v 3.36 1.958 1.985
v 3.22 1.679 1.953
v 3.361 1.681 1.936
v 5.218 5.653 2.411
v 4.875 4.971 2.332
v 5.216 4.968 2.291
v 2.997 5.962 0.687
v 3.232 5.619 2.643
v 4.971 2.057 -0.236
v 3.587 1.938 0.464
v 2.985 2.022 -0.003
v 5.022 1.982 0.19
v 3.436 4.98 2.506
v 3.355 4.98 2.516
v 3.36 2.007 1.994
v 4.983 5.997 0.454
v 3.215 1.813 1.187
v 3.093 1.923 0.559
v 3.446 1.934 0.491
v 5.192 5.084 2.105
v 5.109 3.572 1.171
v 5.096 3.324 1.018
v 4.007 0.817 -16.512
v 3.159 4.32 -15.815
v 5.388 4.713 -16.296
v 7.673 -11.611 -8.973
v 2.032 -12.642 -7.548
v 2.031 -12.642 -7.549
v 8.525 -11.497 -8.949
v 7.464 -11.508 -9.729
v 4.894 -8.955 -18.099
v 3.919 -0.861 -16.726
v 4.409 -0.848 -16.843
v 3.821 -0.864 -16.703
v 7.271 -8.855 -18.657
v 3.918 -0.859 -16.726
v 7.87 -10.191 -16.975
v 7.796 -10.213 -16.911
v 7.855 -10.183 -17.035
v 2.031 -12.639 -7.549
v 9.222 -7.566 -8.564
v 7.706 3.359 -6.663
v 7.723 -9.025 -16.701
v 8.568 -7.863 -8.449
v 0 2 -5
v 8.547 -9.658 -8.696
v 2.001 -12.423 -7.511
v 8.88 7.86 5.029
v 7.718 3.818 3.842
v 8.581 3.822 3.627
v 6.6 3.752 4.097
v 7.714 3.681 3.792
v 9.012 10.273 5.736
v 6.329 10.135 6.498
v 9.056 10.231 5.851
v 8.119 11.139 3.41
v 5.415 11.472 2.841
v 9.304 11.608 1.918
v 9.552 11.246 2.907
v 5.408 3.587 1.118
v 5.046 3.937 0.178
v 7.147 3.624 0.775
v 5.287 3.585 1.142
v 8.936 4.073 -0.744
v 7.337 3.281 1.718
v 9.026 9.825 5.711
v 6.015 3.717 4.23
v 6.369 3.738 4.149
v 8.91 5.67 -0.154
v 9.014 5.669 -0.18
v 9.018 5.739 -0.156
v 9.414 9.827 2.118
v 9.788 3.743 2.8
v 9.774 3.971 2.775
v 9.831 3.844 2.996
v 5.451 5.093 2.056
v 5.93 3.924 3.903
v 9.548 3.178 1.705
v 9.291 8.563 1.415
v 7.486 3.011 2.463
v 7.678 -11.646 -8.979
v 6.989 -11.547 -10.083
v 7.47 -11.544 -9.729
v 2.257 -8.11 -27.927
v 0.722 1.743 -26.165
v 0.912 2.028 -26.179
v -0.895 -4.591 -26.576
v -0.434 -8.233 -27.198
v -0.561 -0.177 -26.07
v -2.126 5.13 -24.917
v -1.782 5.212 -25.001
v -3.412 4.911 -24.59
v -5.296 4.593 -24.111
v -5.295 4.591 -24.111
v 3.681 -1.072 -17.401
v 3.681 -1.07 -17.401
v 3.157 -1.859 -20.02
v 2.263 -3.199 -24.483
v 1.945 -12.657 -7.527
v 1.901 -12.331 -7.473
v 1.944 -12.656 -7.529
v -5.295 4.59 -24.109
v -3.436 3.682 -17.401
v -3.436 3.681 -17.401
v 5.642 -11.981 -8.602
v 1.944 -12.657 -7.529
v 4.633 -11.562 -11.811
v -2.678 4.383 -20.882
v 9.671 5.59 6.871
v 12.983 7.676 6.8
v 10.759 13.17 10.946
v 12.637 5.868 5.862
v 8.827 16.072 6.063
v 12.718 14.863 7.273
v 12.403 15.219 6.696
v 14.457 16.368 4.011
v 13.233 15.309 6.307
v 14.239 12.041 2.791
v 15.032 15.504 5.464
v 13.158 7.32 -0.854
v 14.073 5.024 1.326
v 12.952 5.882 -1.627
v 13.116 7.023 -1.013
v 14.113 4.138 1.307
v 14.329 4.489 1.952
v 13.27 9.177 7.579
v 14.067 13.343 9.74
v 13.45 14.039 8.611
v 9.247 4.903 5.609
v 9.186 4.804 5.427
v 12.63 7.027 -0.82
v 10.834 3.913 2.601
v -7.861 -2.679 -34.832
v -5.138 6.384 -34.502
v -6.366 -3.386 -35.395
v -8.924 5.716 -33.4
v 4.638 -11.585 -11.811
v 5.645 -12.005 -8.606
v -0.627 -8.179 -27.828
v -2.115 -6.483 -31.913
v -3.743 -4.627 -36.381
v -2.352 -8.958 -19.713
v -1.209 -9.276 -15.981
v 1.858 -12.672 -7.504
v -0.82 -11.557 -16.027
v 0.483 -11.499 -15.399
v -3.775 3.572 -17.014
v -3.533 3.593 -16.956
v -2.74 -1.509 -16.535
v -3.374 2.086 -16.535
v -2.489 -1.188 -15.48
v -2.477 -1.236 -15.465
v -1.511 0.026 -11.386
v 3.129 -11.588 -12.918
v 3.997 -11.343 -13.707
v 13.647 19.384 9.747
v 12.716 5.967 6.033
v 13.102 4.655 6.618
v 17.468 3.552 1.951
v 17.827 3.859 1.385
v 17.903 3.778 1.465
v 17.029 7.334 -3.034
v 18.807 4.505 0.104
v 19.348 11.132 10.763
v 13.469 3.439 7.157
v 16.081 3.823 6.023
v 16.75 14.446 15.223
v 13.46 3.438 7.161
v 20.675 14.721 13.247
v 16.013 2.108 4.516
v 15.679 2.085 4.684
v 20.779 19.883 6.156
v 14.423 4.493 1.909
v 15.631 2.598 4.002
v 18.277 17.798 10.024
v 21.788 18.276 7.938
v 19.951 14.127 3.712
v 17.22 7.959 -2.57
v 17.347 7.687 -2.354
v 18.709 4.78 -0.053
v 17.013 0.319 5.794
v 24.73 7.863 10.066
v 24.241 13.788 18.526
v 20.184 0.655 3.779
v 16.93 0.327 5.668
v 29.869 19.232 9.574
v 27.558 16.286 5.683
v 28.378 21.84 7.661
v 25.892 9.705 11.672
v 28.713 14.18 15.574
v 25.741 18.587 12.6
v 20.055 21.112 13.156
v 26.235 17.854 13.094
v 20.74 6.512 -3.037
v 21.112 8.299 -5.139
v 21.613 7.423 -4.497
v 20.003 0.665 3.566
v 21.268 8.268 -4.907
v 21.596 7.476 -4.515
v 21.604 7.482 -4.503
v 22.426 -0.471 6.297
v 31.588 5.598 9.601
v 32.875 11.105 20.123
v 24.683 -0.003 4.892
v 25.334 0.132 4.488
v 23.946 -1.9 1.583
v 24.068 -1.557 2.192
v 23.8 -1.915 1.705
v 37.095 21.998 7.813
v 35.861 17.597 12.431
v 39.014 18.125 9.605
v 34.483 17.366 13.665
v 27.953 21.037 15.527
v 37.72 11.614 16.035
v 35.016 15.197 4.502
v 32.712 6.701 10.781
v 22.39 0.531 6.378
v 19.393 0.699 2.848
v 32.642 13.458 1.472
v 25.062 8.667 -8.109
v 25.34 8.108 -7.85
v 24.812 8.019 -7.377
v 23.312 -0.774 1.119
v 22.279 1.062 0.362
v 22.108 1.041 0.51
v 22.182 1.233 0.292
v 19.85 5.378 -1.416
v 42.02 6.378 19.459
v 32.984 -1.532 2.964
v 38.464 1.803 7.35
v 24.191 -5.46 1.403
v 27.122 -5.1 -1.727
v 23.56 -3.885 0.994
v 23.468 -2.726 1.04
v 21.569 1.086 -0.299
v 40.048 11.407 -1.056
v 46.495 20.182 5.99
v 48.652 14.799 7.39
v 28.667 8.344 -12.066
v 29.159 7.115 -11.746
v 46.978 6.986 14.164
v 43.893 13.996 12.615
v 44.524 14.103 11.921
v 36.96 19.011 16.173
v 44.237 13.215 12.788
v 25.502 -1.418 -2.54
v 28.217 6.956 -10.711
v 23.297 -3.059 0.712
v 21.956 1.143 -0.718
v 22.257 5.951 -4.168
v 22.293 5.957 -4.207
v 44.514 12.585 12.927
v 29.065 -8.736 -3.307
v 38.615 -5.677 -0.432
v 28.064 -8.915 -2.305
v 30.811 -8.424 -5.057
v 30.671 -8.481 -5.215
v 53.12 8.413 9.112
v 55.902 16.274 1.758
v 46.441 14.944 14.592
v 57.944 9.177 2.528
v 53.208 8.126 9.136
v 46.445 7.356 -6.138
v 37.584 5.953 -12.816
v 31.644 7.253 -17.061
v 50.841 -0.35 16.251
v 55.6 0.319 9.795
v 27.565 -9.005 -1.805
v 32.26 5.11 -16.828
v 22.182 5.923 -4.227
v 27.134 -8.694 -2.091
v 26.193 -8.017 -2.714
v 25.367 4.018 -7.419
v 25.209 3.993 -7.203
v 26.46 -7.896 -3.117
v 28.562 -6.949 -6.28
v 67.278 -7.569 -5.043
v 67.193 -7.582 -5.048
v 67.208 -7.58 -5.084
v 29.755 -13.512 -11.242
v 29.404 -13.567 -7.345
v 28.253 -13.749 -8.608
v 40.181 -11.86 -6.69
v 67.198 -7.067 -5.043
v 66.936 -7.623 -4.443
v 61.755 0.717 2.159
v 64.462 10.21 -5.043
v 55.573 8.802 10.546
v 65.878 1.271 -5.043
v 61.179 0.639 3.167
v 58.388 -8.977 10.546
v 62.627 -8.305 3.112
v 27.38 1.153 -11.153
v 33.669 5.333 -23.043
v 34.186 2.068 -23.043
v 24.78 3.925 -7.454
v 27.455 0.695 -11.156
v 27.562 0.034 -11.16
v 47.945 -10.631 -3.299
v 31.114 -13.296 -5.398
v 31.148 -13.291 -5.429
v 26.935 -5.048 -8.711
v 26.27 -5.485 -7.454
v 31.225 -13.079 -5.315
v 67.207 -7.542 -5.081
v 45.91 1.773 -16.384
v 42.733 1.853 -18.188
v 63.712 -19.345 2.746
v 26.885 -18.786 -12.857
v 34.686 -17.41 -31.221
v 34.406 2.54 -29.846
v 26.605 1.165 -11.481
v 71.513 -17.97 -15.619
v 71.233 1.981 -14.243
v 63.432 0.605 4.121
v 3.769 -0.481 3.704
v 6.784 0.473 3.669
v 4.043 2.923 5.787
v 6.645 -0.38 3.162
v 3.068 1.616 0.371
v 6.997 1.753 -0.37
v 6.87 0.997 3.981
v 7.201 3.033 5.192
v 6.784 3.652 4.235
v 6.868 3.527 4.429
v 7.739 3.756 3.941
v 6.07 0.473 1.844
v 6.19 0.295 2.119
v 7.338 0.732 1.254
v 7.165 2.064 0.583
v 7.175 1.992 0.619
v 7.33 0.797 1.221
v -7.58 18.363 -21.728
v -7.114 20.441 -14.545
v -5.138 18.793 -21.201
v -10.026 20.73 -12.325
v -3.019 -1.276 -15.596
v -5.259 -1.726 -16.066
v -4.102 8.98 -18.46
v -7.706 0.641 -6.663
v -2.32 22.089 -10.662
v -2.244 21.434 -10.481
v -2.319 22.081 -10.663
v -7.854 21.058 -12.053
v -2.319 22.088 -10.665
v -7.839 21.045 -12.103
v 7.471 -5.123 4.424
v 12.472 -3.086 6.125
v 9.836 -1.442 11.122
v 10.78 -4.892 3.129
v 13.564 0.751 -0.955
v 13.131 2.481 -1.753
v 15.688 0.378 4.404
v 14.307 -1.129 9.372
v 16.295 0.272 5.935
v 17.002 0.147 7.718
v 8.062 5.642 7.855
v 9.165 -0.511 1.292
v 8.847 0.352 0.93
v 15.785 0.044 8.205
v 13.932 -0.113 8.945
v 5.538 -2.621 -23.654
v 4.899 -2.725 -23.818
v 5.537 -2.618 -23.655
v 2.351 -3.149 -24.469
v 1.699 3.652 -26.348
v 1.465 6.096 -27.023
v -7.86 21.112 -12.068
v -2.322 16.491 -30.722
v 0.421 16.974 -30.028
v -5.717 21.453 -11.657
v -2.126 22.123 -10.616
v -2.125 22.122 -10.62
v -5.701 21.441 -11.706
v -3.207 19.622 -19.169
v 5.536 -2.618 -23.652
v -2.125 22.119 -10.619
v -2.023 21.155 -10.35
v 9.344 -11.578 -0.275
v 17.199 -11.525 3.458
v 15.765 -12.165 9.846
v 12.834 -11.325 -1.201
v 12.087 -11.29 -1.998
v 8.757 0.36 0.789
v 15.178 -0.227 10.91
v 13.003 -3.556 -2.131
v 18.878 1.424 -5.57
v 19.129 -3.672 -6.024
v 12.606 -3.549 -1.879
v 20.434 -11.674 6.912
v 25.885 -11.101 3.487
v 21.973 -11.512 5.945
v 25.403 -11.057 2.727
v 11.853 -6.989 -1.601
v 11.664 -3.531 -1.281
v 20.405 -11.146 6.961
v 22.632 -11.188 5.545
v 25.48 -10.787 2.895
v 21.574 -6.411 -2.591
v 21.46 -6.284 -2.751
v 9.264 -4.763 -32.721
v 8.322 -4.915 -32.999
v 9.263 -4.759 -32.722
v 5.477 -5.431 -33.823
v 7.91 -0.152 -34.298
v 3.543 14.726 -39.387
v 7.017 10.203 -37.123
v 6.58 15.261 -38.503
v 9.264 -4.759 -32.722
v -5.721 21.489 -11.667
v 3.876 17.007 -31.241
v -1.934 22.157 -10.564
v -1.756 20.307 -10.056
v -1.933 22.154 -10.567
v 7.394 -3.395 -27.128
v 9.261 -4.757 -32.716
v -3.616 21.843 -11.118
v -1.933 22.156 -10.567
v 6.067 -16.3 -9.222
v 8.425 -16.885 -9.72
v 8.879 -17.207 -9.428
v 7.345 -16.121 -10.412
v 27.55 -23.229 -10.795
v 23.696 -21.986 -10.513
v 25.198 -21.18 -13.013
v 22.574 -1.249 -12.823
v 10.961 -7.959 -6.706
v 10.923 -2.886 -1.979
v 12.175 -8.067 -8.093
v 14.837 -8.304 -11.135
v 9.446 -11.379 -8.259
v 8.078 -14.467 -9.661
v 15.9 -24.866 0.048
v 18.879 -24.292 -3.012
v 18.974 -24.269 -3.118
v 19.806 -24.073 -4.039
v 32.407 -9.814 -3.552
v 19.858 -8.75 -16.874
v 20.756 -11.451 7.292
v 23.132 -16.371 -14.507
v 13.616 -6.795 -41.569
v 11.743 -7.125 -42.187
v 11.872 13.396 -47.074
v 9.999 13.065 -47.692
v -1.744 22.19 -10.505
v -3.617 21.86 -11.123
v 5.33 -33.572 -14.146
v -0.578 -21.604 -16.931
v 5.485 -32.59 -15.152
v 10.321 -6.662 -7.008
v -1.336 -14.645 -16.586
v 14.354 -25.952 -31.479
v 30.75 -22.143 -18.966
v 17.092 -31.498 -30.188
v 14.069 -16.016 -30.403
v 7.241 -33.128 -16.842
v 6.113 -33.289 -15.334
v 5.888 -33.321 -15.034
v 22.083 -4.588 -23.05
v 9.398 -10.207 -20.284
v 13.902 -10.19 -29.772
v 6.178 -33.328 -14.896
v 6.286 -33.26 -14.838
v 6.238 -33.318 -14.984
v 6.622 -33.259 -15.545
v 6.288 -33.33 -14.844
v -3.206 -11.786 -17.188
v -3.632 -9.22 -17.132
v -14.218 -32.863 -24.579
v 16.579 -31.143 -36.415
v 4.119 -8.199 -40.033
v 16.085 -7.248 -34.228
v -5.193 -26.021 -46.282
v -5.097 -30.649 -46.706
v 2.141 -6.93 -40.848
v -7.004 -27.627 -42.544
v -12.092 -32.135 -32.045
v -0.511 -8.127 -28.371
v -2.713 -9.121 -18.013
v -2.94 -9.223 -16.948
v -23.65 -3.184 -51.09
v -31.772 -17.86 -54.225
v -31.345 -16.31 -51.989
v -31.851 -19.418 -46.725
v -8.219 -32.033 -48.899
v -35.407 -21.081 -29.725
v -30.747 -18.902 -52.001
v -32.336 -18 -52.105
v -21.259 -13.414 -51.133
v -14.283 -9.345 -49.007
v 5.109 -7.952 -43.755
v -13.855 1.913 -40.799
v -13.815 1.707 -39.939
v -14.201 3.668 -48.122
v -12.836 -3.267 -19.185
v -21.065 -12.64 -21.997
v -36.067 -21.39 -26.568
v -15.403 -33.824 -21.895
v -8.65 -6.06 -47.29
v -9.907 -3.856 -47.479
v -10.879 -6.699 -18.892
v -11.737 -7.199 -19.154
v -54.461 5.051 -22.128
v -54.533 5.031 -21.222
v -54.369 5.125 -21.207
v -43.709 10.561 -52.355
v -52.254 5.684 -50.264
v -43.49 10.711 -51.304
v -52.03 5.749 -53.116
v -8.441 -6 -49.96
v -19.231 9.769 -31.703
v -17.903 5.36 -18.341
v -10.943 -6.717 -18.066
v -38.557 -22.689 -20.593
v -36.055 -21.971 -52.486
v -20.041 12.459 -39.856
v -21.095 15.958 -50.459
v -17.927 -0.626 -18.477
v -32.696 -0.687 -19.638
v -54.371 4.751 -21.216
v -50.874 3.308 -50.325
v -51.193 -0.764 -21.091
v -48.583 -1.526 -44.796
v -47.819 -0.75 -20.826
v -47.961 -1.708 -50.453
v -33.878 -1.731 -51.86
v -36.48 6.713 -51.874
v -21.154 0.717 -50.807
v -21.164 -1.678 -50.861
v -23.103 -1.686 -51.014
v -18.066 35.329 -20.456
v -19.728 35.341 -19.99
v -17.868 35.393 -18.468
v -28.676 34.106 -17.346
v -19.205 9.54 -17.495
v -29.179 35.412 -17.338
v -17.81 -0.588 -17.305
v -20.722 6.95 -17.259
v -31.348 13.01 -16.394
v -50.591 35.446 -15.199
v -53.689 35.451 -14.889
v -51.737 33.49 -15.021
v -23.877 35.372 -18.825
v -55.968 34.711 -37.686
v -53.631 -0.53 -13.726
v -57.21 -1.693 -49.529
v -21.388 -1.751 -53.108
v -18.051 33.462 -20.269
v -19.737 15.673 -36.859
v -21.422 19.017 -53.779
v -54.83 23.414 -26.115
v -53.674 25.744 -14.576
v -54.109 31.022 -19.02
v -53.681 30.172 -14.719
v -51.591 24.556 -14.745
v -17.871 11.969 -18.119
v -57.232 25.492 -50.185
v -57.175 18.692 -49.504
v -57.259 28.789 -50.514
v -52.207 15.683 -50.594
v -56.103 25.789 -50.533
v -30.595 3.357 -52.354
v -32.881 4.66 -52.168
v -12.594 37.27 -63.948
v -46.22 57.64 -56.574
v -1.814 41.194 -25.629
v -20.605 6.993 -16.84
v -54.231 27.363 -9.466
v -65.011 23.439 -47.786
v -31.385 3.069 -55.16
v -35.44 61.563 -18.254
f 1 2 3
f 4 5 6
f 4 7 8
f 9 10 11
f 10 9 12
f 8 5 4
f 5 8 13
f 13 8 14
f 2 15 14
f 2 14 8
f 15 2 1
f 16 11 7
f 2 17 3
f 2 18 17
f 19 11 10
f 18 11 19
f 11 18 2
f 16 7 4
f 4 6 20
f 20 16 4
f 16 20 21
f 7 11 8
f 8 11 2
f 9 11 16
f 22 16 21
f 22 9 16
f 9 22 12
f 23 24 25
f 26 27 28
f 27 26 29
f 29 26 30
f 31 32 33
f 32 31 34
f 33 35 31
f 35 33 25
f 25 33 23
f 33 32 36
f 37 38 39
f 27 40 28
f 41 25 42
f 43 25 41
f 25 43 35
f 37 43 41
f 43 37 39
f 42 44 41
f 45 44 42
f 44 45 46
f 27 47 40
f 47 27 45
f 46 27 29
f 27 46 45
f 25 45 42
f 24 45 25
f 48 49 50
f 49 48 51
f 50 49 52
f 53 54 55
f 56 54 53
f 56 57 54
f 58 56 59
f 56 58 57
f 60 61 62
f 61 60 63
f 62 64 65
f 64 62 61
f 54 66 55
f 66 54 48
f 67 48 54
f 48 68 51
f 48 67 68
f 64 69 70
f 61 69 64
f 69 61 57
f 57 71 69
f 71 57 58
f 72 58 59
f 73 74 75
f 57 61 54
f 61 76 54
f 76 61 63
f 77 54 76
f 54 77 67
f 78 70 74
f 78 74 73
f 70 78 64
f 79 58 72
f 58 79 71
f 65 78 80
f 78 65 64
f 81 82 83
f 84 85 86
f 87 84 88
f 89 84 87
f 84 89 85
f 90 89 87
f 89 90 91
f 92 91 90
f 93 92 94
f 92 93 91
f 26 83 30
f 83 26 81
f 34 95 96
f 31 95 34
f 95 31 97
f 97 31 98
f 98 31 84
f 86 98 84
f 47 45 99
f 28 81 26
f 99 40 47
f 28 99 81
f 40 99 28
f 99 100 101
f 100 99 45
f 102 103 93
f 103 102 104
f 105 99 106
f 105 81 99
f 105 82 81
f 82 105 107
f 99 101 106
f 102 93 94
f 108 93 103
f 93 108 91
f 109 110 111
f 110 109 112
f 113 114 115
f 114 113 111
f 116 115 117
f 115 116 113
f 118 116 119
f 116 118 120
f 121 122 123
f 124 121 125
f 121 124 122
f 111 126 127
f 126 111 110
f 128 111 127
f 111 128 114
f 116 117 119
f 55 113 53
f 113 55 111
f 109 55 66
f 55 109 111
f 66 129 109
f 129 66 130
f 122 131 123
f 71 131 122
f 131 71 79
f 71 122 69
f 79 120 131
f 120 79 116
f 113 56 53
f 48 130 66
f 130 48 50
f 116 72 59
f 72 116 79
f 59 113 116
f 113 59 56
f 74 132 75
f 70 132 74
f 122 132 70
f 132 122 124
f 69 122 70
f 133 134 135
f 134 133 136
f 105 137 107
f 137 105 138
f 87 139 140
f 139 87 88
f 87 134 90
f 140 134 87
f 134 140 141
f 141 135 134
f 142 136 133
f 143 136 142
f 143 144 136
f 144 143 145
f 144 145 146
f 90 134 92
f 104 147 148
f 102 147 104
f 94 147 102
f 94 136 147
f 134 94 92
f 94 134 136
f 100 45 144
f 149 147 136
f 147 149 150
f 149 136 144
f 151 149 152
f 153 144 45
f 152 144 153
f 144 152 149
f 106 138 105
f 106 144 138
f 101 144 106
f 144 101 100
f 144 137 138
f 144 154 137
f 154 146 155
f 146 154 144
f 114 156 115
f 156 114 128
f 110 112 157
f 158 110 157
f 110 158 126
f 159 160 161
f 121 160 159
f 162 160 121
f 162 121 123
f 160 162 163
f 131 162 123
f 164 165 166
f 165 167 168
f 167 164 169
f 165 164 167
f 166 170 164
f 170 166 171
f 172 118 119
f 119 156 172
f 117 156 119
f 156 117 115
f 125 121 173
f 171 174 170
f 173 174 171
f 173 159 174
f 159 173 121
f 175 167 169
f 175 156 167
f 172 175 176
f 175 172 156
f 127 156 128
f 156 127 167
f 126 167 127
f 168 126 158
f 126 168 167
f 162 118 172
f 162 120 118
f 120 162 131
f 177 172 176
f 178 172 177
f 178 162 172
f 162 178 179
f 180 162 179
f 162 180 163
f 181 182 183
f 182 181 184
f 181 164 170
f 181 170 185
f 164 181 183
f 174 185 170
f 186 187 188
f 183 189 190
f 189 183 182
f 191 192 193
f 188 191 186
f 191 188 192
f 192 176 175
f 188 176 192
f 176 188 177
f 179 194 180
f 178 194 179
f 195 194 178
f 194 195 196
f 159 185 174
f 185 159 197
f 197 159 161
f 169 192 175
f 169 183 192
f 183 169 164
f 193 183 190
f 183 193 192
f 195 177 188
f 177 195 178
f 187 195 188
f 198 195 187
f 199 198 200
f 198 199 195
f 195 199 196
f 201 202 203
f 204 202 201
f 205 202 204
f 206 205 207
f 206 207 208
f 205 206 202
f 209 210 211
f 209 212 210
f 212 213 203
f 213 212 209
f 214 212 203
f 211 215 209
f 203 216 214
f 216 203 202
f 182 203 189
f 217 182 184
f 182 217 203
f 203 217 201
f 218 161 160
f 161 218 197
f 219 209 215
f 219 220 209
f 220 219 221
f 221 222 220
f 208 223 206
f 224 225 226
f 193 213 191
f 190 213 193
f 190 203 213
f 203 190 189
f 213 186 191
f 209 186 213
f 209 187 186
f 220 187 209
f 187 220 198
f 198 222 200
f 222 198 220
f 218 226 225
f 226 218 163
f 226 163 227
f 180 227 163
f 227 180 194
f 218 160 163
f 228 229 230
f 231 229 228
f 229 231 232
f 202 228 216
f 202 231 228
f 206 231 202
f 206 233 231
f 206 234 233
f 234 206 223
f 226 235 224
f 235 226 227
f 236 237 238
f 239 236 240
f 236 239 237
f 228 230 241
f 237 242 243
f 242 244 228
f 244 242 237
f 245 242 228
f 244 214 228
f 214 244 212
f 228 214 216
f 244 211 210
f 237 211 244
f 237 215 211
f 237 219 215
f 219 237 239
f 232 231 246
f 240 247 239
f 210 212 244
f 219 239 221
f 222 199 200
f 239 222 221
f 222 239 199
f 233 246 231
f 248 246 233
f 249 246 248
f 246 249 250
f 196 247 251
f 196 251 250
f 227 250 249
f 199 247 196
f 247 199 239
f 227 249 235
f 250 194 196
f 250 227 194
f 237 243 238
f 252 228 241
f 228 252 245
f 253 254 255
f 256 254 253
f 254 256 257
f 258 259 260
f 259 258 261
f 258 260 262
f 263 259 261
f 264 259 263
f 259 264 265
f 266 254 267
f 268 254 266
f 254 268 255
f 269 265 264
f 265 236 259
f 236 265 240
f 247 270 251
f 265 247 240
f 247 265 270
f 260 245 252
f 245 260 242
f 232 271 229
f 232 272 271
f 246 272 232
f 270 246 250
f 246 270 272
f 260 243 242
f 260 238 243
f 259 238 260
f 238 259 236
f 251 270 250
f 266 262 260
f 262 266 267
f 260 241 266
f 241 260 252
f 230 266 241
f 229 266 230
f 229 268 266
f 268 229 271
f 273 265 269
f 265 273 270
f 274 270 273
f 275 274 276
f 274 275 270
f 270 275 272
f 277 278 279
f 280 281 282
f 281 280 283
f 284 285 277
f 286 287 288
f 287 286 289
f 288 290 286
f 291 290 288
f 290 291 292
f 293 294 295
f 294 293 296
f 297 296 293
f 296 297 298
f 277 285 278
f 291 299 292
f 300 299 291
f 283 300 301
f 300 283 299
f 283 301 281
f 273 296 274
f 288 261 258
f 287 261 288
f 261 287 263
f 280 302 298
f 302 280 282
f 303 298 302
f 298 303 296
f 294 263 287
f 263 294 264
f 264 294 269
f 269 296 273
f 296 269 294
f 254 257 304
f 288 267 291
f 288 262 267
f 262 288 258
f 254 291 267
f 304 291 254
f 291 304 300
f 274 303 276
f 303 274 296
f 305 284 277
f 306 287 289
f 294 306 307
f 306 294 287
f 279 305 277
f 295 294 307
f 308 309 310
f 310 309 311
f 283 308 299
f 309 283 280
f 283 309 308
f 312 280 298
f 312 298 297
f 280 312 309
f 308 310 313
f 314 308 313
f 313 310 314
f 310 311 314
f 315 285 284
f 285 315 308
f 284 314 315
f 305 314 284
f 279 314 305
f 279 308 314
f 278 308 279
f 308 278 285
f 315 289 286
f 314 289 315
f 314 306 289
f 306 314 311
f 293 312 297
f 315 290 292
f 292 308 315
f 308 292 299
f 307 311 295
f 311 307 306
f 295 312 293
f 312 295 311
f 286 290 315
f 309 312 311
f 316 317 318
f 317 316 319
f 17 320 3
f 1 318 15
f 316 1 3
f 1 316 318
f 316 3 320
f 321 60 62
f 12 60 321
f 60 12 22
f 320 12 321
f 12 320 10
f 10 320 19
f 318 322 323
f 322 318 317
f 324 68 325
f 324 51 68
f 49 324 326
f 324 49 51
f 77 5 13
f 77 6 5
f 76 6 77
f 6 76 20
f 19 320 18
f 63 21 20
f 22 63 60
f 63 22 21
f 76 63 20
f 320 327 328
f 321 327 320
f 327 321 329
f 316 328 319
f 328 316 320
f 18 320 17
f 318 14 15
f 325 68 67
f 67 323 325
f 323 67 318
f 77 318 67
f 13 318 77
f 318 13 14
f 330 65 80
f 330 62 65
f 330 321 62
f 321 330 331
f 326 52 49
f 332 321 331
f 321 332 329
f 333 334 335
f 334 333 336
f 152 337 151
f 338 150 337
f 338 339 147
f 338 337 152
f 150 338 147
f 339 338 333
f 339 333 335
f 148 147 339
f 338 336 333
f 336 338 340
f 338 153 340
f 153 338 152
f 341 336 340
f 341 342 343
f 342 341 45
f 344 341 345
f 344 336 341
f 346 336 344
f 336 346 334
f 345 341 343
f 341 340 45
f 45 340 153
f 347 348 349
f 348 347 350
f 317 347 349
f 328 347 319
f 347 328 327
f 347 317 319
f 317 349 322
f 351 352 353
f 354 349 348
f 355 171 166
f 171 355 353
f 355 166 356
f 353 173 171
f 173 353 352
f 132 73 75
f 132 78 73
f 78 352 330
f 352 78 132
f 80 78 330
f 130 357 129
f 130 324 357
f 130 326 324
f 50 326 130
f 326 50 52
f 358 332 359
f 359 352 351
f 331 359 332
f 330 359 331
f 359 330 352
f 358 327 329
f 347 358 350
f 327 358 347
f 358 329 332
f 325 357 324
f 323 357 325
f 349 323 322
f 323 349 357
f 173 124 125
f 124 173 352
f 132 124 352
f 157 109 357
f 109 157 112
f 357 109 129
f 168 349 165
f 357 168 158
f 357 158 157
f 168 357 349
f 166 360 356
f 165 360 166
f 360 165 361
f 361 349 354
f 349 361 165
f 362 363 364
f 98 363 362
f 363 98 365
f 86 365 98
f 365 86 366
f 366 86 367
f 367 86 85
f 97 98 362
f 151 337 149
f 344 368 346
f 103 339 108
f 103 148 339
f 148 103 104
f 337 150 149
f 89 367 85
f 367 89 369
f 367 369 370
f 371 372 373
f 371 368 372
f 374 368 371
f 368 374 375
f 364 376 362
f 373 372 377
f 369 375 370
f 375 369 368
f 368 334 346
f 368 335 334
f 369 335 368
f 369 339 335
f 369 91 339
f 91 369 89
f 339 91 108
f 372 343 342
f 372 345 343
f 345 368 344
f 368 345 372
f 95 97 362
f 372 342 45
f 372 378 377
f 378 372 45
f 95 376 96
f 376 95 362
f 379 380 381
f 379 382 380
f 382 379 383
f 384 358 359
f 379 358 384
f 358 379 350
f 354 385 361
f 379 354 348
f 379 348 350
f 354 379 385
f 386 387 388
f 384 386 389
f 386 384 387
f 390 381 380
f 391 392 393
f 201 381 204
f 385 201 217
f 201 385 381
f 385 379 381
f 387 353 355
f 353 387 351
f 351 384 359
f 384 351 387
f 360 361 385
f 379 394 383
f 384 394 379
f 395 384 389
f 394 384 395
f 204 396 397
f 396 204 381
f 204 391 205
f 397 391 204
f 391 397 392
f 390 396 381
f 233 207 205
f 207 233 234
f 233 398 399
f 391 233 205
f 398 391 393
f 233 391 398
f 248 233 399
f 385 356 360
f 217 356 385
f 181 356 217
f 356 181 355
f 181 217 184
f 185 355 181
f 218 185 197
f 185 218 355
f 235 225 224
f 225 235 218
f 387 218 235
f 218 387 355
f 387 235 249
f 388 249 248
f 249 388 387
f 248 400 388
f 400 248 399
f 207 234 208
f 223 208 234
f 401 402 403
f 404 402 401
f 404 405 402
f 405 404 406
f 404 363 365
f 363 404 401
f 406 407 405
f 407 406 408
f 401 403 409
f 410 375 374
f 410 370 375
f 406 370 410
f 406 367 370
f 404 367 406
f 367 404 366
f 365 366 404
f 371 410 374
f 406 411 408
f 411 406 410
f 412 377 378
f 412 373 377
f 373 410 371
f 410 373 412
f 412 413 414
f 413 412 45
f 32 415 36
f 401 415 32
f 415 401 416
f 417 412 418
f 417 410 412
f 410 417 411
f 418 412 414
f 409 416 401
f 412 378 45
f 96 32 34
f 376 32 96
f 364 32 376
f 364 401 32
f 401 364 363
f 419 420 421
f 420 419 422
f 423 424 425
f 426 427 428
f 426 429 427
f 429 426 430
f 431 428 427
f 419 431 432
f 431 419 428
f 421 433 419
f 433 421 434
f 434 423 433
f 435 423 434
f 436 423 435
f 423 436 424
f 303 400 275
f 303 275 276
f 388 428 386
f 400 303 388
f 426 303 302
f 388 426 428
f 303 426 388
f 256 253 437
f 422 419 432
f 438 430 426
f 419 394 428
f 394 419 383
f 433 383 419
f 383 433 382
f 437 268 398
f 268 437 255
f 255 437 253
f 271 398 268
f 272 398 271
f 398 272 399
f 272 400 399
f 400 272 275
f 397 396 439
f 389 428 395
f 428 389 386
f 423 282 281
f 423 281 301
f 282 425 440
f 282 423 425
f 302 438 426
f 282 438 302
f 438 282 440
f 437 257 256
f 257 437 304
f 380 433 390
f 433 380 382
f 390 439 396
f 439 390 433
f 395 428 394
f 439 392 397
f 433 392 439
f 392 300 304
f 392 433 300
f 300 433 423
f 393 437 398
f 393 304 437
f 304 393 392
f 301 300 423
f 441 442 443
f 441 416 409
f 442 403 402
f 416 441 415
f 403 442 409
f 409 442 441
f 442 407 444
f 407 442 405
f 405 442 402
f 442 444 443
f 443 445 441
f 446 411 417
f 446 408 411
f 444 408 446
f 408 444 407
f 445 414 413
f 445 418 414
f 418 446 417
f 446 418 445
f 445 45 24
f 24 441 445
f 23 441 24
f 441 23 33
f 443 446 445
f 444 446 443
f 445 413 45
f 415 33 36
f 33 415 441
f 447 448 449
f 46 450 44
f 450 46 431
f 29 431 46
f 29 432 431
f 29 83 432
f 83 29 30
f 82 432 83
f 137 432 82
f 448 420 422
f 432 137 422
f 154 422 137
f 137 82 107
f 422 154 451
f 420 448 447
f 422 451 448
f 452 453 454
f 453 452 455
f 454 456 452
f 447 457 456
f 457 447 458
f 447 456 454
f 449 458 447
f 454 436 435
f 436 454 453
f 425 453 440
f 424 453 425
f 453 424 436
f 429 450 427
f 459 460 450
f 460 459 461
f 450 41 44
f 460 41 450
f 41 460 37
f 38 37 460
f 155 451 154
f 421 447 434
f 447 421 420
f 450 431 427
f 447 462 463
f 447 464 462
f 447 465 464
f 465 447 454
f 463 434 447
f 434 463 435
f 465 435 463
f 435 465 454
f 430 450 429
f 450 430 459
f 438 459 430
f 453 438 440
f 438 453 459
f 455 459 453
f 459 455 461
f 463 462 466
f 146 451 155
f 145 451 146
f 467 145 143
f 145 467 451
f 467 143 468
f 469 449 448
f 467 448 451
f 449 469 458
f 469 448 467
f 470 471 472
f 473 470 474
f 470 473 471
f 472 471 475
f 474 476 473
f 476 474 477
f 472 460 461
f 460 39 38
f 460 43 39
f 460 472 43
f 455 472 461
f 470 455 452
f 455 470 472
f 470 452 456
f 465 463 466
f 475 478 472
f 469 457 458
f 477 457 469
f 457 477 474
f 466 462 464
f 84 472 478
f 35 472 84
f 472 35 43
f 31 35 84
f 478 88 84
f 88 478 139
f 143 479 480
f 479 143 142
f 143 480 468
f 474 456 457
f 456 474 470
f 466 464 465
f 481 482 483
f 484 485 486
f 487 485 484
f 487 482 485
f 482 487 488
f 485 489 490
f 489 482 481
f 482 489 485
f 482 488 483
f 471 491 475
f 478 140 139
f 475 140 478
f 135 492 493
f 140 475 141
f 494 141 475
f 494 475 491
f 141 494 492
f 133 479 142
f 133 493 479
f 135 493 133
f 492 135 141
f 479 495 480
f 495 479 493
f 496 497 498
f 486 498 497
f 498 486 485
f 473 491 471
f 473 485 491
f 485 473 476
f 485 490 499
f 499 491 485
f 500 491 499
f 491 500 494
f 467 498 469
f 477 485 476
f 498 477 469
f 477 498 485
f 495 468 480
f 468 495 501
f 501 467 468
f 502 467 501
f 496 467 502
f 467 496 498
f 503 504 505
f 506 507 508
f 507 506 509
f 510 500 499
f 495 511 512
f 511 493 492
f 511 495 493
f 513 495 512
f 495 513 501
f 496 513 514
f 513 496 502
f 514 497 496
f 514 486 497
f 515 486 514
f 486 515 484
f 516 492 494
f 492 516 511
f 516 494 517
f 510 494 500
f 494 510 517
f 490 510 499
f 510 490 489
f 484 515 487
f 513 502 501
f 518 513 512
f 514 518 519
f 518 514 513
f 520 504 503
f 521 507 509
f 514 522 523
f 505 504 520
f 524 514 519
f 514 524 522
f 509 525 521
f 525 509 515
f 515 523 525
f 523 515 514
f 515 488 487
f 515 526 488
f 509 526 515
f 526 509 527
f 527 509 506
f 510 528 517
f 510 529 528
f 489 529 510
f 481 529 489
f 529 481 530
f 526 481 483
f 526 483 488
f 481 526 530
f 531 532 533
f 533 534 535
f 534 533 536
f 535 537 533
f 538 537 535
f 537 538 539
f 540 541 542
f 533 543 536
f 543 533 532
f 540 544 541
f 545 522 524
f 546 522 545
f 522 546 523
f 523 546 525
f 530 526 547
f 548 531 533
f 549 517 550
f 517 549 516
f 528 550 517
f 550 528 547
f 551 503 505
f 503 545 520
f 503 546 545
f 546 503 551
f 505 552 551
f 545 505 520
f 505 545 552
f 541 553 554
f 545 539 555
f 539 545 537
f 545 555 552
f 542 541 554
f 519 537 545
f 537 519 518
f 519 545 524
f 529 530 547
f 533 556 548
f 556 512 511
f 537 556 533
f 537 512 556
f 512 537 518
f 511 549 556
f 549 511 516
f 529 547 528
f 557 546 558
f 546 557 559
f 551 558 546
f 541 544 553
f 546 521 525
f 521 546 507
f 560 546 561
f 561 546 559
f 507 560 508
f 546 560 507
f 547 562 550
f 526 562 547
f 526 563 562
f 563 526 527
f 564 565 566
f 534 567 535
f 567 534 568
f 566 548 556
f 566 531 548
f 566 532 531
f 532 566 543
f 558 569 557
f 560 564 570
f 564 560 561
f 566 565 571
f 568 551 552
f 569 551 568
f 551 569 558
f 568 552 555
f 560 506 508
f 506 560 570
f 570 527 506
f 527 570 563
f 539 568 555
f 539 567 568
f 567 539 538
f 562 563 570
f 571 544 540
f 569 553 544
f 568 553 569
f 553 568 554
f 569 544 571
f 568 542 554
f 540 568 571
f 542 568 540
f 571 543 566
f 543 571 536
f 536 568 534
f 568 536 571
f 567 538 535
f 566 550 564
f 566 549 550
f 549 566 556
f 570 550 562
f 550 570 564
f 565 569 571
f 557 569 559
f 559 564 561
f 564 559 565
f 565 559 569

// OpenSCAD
/*
  this'll get you started ;)
*/
for (y = [10 : 6 : 20]) {
  for (x = [0 : 2 : 20]) {
    if ( y % 4 != 0) {
      rotate([x*y/2,y*x/3,x/2])
        translate([x+1,y*x/10,0])
        cube([x,x + (x*y*0.1),x]);
    } else {
      rotate([x*y,y*x/3,x])
        translate([x+1,y*x/18,0])
        cube([x*2,x*2,x*2]);
    }
    union() {
      if (2/x*y*y/30 > 1) {
        translate([0,2,-5])
          rotate([y,70-(x)+100,90*y+10])
          cube([10-x,5+y,x*5]);
      }
    }
  }
}
